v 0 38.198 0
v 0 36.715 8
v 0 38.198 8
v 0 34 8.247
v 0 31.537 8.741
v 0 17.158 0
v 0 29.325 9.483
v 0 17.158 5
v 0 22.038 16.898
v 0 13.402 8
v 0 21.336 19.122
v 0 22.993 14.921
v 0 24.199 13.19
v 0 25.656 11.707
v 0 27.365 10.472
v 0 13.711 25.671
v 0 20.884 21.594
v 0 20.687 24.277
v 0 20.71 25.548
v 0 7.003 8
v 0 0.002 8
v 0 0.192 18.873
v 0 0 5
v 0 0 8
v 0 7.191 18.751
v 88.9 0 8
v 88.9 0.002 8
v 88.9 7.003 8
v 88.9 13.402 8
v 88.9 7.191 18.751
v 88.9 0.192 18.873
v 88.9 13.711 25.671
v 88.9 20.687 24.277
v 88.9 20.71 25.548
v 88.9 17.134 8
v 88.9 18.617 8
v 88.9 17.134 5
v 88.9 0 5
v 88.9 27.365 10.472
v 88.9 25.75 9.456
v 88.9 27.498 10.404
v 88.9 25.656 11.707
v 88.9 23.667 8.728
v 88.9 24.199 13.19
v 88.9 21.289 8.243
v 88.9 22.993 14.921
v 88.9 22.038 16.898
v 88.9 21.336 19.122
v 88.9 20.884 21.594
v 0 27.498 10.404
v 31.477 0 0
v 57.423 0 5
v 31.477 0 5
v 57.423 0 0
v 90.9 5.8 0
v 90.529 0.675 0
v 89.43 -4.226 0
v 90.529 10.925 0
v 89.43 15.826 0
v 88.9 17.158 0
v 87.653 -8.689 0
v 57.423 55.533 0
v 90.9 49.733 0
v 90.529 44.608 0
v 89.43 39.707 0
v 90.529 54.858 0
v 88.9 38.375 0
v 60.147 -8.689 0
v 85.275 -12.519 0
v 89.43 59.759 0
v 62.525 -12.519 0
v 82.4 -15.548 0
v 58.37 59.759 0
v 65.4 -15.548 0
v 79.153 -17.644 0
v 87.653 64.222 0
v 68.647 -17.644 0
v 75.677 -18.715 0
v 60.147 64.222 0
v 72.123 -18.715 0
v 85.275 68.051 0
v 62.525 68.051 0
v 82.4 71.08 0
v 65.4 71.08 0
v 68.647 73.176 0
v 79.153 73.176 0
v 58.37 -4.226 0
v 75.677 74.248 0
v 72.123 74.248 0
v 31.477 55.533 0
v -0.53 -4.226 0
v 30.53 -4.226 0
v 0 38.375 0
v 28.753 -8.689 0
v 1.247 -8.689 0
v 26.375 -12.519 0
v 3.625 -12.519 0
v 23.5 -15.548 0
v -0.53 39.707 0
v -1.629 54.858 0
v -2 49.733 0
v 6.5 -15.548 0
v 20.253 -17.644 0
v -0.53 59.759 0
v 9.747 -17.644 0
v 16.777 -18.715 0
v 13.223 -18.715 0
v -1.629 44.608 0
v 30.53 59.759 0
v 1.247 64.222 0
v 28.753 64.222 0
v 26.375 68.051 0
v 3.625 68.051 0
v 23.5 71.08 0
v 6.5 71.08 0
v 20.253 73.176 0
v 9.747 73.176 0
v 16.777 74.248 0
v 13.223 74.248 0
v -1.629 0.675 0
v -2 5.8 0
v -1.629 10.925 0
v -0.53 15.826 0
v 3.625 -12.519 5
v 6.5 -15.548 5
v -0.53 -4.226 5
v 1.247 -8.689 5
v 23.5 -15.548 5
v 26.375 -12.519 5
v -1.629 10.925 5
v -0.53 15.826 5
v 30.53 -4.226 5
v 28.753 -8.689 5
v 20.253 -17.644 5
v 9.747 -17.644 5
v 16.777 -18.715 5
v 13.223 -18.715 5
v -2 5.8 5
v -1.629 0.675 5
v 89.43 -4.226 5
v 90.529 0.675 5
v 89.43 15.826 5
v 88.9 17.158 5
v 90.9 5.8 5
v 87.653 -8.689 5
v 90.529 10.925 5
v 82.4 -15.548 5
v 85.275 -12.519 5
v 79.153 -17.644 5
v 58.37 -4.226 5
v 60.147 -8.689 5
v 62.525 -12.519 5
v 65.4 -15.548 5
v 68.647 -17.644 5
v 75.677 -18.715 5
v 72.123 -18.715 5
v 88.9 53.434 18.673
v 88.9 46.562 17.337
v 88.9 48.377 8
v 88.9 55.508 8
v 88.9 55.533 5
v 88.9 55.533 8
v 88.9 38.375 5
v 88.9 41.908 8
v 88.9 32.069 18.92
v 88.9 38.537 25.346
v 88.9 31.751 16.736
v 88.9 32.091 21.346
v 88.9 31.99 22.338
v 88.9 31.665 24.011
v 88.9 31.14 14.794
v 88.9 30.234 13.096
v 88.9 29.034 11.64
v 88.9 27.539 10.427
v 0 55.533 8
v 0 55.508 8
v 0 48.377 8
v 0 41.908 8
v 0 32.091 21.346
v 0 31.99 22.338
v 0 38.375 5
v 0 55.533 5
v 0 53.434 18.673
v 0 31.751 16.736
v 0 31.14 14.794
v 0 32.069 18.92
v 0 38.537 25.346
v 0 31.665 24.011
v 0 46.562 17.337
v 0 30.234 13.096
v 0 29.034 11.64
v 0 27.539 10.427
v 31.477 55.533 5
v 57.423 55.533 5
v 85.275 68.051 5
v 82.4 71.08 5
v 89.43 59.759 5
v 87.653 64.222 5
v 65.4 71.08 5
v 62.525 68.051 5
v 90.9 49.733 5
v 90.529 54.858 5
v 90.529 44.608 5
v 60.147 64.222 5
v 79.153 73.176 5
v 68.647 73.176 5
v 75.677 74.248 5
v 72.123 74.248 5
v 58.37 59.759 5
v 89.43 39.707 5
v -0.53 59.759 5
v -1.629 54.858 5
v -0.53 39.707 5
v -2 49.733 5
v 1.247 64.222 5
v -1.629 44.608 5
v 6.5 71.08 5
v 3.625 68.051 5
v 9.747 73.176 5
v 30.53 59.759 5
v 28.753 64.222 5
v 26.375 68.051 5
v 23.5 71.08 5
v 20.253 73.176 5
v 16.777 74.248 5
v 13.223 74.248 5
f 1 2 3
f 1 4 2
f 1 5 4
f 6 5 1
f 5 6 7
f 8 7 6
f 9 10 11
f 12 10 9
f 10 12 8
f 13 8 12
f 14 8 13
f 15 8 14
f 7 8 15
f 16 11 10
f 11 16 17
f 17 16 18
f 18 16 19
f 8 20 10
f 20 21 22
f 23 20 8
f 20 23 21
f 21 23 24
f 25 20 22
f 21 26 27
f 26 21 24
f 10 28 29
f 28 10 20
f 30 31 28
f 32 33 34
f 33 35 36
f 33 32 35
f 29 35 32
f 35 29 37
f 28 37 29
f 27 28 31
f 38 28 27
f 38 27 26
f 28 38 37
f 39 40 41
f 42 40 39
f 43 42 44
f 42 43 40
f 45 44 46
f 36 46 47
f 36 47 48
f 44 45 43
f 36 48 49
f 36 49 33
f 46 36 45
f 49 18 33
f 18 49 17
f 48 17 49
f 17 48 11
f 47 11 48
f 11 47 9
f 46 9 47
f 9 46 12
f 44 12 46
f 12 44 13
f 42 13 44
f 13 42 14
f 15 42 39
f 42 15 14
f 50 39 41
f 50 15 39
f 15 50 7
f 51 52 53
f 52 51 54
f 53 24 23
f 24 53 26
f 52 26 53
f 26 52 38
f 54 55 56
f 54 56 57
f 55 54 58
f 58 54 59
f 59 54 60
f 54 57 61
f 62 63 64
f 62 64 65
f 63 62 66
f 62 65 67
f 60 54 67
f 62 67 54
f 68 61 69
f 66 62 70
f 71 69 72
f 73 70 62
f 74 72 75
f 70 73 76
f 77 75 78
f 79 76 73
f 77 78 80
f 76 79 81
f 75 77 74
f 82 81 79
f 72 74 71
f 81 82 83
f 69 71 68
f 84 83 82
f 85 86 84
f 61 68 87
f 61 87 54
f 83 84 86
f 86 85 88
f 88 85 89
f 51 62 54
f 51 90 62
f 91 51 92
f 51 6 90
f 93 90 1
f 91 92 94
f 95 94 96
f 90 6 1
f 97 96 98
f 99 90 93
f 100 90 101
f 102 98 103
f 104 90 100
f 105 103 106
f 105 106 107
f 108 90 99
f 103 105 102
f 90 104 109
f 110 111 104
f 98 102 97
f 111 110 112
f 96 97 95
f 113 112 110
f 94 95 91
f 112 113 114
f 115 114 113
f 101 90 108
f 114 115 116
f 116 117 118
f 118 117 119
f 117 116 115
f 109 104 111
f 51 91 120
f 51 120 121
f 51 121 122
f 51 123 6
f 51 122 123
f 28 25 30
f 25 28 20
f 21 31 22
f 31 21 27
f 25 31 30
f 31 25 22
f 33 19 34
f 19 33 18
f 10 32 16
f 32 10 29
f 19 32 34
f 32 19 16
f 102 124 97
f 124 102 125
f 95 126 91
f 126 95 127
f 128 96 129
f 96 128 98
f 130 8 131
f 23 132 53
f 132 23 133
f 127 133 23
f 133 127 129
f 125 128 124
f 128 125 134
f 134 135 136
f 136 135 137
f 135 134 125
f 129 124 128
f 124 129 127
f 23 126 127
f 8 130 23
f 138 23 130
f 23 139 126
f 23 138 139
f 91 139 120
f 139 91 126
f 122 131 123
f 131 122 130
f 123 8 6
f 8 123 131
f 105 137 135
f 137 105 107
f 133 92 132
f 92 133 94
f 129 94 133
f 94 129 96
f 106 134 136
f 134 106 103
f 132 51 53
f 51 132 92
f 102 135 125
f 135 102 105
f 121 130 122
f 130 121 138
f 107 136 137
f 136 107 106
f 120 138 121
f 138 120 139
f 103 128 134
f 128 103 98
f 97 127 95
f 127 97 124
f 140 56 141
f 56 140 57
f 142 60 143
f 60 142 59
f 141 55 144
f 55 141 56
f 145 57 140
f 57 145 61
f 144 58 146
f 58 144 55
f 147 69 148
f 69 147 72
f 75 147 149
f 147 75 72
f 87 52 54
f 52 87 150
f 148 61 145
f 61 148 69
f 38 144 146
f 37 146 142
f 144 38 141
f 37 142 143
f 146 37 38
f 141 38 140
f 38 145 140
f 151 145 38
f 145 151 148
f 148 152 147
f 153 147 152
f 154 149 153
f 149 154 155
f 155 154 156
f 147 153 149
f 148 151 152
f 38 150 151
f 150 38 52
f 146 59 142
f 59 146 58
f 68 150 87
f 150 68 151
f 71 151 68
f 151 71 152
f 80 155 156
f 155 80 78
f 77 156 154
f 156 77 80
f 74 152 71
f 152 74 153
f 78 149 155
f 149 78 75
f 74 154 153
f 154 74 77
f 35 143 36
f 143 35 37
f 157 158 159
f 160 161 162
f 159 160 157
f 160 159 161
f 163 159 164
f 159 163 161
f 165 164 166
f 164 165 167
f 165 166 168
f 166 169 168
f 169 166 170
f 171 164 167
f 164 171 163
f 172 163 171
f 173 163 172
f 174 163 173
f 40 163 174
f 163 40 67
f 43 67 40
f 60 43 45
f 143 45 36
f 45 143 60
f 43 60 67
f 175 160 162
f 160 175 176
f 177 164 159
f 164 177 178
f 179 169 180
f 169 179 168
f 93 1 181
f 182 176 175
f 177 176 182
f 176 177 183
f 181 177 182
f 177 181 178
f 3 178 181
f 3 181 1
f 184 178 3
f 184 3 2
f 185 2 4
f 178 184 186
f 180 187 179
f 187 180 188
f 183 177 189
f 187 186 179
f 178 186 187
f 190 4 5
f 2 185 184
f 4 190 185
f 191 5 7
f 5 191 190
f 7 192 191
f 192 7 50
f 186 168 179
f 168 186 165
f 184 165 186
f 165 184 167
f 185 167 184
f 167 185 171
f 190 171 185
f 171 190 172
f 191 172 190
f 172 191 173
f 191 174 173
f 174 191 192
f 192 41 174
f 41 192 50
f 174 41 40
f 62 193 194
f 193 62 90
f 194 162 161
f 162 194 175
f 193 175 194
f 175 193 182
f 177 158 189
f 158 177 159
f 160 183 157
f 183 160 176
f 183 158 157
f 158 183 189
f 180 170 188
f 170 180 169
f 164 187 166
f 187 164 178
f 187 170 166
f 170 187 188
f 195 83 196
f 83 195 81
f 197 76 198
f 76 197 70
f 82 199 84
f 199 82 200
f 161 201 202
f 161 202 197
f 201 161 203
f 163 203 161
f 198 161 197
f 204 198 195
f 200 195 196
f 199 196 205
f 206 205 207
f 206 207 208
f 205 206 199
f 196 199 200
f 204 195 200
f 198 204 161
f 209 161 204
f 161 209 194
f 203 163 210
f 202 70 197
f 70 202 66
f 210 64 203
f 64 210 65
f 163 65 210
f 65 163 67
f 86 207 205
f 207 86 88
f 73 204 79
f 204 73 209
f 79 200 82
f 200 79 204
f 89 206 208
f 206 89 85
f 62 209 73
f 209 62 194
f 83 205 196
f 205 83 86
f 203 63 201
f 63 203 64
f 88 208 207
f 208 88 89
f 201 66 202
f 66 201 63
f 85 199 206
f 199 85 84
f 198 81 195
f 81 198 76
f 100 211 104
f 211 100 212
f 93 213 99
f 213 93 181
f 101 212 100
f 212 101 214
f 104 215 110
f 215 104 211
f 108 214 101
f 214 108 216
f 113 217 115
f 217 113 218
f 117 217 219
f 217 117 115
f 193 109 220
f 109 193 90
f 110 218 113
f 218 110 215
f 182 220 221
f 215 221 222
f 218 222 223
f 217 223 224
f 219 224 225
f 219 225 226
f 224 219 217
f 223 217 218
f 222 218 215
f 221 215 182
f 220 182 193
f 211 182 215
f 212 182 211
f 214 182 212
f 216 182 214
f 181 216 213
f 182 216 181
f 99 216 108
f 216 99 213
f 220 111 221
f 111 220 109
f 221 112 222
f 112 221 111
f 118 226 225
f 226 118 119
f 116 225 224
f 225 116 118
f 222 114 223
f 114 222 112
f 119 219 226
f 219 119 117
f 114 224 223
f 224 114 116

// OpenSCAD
/* [Hidden] */
goldenratio = 1.61803399;
joinfactor = 0.125;

/* [Stand Side 1] */
// Angle of Repose (degrees)
gAngleOfRepose = 1;
// Thickness of tablet (include a buffer of ~0.3-0.6mm; wider angles require larger buffers)
gMaterialThickness = 6.4;

/* [Stand Side 2] */
// Angle of Repose (degrees)
g2AngleOfRepose = 11;
// Thickness of tablet (include a buffer of ~0.3-0.6mm; wider angles require larger buffers)
g2MaterialThickness = 6.6;

/* [Global Settings] */
// Thickness (mm) of the walls that hold the tablet
gWallThickness = 7;
// Width (mm) of the rectangular portion of the stand
gBaseWidth = 88.9;
// Thickness (mm) of the rectangular base
gBaseThickness = 8;
// Height (mm) of front block that holds tablet in place
gBaseFrontBlockHeight = 11;


union()
{
rotate([90, 0, 90])
    Bracket(gBaseFrontBlockHeight, gMaterialThickness, gAngleOfRepose, gBaseWidth);

//Calculate Offset to combine
combineOffset = 1.45*(gWallThickness*2+((gMaterialThickness+g2MaterialThickness)/2)+(gBaseFrontBlockHeight*goldenratio));

translate([gBaseWidth,combineOffset,0])
    rotate([90, 0, -90]) 
        Bracket(gBaseFrontBlockHeight, g2MaterialThickness, g2AngleOfRepose, gBaseWidth) ;
}

//================================
// Modules
//================================
module FillWeb(L11,L12,L21,L22, thickness, steps) 
{
	width1 = L12[0]-L11[0];
	height1 = L12[1]-L11[1];
	echo("width1, height1", width1, height1);
	
	width2 = L22[0]-L21[0];
	height2 = L22[1]-L21[1];
	echo("width2, height2", width2, height2);
	
	dwidth1 = width1/steps;
	dwidth2= width2/steps;
	
	dheight1 = height1/steps;
	dheight2 = height2/steps;
	
	m1 = height1/width1;
	m2 = height2/width2;
	
	x1=0;
	y1=0;
	
	x2=0;
	y2=0;
	
	for (step=[0:steps-1])
	{
		linear_extrude(height = thickness, convexity = 10)
		polygon(
			points=[[ width1 - step*dwidth1, L12[1]-step*dheight1],
			[0,0],
			[ L21[0] + step*dwidth2, L21[1] + step*dheight2]], 
			paths=[[0,1,2,0]]
		); 
	}

}

module Bracket(frontBlock, gapsize, repose, width)
{
	backBlock = frontBlock * goldenratio;

	baselength = gWallThickness*2+gapsize+backBlock;

	
	webShortTopHeight = frontBlock * sin(90-repose);
	webShortTopLength = frontBlock * cos(90-repose);

	webTopHeight = backBlock * sin(90-repose);
	webTopLength = backBlock * cos(90-repose);

	webBottomLength = backBlock;
	webShortBottomLength = frontBlock;

	webOffset = [(baselength) -webBottomLength, gBaseThickness, 0];
	webShortOffset = [baselength -webBottomLength, gBaseThickness, -joinfactor];

	// Lay down the base
	cube(size=[baselength, gBaseThickness, width]);

	// Add supporting fillet
	translate(webOffset)
	color([0,1,1]) FillWeb([0,0],[webTopLength,webTopHeight], [0,0], [webBottomLength,0], width, 12);


	// Front block
	translate([0, gBaseThickness-joinfactor, 0])
	rotate([0, 0, -repose])
	cube(size=[gWallThickness, frontBlock, width]);

	// Back block
	translate([gWallThickness+gapsize,  gBaseThickness-joinfactor, 0])
	rotate([0, 0, -repose])
	cube(size=[gWallThickness, backBlock, width]);
    
    //Feet
    scale([1.45,1,1])
        translate([4,0,15])    
            rotate([0, -90, -90]) 
                cylinder (5,17,17,0);
    
    scale([1.45,1,1])
        translate([4,0,(gBaseWidth-15)])    
            rotate([0, -90, -90]) 
                cylinder (5,17,17,0);


}
